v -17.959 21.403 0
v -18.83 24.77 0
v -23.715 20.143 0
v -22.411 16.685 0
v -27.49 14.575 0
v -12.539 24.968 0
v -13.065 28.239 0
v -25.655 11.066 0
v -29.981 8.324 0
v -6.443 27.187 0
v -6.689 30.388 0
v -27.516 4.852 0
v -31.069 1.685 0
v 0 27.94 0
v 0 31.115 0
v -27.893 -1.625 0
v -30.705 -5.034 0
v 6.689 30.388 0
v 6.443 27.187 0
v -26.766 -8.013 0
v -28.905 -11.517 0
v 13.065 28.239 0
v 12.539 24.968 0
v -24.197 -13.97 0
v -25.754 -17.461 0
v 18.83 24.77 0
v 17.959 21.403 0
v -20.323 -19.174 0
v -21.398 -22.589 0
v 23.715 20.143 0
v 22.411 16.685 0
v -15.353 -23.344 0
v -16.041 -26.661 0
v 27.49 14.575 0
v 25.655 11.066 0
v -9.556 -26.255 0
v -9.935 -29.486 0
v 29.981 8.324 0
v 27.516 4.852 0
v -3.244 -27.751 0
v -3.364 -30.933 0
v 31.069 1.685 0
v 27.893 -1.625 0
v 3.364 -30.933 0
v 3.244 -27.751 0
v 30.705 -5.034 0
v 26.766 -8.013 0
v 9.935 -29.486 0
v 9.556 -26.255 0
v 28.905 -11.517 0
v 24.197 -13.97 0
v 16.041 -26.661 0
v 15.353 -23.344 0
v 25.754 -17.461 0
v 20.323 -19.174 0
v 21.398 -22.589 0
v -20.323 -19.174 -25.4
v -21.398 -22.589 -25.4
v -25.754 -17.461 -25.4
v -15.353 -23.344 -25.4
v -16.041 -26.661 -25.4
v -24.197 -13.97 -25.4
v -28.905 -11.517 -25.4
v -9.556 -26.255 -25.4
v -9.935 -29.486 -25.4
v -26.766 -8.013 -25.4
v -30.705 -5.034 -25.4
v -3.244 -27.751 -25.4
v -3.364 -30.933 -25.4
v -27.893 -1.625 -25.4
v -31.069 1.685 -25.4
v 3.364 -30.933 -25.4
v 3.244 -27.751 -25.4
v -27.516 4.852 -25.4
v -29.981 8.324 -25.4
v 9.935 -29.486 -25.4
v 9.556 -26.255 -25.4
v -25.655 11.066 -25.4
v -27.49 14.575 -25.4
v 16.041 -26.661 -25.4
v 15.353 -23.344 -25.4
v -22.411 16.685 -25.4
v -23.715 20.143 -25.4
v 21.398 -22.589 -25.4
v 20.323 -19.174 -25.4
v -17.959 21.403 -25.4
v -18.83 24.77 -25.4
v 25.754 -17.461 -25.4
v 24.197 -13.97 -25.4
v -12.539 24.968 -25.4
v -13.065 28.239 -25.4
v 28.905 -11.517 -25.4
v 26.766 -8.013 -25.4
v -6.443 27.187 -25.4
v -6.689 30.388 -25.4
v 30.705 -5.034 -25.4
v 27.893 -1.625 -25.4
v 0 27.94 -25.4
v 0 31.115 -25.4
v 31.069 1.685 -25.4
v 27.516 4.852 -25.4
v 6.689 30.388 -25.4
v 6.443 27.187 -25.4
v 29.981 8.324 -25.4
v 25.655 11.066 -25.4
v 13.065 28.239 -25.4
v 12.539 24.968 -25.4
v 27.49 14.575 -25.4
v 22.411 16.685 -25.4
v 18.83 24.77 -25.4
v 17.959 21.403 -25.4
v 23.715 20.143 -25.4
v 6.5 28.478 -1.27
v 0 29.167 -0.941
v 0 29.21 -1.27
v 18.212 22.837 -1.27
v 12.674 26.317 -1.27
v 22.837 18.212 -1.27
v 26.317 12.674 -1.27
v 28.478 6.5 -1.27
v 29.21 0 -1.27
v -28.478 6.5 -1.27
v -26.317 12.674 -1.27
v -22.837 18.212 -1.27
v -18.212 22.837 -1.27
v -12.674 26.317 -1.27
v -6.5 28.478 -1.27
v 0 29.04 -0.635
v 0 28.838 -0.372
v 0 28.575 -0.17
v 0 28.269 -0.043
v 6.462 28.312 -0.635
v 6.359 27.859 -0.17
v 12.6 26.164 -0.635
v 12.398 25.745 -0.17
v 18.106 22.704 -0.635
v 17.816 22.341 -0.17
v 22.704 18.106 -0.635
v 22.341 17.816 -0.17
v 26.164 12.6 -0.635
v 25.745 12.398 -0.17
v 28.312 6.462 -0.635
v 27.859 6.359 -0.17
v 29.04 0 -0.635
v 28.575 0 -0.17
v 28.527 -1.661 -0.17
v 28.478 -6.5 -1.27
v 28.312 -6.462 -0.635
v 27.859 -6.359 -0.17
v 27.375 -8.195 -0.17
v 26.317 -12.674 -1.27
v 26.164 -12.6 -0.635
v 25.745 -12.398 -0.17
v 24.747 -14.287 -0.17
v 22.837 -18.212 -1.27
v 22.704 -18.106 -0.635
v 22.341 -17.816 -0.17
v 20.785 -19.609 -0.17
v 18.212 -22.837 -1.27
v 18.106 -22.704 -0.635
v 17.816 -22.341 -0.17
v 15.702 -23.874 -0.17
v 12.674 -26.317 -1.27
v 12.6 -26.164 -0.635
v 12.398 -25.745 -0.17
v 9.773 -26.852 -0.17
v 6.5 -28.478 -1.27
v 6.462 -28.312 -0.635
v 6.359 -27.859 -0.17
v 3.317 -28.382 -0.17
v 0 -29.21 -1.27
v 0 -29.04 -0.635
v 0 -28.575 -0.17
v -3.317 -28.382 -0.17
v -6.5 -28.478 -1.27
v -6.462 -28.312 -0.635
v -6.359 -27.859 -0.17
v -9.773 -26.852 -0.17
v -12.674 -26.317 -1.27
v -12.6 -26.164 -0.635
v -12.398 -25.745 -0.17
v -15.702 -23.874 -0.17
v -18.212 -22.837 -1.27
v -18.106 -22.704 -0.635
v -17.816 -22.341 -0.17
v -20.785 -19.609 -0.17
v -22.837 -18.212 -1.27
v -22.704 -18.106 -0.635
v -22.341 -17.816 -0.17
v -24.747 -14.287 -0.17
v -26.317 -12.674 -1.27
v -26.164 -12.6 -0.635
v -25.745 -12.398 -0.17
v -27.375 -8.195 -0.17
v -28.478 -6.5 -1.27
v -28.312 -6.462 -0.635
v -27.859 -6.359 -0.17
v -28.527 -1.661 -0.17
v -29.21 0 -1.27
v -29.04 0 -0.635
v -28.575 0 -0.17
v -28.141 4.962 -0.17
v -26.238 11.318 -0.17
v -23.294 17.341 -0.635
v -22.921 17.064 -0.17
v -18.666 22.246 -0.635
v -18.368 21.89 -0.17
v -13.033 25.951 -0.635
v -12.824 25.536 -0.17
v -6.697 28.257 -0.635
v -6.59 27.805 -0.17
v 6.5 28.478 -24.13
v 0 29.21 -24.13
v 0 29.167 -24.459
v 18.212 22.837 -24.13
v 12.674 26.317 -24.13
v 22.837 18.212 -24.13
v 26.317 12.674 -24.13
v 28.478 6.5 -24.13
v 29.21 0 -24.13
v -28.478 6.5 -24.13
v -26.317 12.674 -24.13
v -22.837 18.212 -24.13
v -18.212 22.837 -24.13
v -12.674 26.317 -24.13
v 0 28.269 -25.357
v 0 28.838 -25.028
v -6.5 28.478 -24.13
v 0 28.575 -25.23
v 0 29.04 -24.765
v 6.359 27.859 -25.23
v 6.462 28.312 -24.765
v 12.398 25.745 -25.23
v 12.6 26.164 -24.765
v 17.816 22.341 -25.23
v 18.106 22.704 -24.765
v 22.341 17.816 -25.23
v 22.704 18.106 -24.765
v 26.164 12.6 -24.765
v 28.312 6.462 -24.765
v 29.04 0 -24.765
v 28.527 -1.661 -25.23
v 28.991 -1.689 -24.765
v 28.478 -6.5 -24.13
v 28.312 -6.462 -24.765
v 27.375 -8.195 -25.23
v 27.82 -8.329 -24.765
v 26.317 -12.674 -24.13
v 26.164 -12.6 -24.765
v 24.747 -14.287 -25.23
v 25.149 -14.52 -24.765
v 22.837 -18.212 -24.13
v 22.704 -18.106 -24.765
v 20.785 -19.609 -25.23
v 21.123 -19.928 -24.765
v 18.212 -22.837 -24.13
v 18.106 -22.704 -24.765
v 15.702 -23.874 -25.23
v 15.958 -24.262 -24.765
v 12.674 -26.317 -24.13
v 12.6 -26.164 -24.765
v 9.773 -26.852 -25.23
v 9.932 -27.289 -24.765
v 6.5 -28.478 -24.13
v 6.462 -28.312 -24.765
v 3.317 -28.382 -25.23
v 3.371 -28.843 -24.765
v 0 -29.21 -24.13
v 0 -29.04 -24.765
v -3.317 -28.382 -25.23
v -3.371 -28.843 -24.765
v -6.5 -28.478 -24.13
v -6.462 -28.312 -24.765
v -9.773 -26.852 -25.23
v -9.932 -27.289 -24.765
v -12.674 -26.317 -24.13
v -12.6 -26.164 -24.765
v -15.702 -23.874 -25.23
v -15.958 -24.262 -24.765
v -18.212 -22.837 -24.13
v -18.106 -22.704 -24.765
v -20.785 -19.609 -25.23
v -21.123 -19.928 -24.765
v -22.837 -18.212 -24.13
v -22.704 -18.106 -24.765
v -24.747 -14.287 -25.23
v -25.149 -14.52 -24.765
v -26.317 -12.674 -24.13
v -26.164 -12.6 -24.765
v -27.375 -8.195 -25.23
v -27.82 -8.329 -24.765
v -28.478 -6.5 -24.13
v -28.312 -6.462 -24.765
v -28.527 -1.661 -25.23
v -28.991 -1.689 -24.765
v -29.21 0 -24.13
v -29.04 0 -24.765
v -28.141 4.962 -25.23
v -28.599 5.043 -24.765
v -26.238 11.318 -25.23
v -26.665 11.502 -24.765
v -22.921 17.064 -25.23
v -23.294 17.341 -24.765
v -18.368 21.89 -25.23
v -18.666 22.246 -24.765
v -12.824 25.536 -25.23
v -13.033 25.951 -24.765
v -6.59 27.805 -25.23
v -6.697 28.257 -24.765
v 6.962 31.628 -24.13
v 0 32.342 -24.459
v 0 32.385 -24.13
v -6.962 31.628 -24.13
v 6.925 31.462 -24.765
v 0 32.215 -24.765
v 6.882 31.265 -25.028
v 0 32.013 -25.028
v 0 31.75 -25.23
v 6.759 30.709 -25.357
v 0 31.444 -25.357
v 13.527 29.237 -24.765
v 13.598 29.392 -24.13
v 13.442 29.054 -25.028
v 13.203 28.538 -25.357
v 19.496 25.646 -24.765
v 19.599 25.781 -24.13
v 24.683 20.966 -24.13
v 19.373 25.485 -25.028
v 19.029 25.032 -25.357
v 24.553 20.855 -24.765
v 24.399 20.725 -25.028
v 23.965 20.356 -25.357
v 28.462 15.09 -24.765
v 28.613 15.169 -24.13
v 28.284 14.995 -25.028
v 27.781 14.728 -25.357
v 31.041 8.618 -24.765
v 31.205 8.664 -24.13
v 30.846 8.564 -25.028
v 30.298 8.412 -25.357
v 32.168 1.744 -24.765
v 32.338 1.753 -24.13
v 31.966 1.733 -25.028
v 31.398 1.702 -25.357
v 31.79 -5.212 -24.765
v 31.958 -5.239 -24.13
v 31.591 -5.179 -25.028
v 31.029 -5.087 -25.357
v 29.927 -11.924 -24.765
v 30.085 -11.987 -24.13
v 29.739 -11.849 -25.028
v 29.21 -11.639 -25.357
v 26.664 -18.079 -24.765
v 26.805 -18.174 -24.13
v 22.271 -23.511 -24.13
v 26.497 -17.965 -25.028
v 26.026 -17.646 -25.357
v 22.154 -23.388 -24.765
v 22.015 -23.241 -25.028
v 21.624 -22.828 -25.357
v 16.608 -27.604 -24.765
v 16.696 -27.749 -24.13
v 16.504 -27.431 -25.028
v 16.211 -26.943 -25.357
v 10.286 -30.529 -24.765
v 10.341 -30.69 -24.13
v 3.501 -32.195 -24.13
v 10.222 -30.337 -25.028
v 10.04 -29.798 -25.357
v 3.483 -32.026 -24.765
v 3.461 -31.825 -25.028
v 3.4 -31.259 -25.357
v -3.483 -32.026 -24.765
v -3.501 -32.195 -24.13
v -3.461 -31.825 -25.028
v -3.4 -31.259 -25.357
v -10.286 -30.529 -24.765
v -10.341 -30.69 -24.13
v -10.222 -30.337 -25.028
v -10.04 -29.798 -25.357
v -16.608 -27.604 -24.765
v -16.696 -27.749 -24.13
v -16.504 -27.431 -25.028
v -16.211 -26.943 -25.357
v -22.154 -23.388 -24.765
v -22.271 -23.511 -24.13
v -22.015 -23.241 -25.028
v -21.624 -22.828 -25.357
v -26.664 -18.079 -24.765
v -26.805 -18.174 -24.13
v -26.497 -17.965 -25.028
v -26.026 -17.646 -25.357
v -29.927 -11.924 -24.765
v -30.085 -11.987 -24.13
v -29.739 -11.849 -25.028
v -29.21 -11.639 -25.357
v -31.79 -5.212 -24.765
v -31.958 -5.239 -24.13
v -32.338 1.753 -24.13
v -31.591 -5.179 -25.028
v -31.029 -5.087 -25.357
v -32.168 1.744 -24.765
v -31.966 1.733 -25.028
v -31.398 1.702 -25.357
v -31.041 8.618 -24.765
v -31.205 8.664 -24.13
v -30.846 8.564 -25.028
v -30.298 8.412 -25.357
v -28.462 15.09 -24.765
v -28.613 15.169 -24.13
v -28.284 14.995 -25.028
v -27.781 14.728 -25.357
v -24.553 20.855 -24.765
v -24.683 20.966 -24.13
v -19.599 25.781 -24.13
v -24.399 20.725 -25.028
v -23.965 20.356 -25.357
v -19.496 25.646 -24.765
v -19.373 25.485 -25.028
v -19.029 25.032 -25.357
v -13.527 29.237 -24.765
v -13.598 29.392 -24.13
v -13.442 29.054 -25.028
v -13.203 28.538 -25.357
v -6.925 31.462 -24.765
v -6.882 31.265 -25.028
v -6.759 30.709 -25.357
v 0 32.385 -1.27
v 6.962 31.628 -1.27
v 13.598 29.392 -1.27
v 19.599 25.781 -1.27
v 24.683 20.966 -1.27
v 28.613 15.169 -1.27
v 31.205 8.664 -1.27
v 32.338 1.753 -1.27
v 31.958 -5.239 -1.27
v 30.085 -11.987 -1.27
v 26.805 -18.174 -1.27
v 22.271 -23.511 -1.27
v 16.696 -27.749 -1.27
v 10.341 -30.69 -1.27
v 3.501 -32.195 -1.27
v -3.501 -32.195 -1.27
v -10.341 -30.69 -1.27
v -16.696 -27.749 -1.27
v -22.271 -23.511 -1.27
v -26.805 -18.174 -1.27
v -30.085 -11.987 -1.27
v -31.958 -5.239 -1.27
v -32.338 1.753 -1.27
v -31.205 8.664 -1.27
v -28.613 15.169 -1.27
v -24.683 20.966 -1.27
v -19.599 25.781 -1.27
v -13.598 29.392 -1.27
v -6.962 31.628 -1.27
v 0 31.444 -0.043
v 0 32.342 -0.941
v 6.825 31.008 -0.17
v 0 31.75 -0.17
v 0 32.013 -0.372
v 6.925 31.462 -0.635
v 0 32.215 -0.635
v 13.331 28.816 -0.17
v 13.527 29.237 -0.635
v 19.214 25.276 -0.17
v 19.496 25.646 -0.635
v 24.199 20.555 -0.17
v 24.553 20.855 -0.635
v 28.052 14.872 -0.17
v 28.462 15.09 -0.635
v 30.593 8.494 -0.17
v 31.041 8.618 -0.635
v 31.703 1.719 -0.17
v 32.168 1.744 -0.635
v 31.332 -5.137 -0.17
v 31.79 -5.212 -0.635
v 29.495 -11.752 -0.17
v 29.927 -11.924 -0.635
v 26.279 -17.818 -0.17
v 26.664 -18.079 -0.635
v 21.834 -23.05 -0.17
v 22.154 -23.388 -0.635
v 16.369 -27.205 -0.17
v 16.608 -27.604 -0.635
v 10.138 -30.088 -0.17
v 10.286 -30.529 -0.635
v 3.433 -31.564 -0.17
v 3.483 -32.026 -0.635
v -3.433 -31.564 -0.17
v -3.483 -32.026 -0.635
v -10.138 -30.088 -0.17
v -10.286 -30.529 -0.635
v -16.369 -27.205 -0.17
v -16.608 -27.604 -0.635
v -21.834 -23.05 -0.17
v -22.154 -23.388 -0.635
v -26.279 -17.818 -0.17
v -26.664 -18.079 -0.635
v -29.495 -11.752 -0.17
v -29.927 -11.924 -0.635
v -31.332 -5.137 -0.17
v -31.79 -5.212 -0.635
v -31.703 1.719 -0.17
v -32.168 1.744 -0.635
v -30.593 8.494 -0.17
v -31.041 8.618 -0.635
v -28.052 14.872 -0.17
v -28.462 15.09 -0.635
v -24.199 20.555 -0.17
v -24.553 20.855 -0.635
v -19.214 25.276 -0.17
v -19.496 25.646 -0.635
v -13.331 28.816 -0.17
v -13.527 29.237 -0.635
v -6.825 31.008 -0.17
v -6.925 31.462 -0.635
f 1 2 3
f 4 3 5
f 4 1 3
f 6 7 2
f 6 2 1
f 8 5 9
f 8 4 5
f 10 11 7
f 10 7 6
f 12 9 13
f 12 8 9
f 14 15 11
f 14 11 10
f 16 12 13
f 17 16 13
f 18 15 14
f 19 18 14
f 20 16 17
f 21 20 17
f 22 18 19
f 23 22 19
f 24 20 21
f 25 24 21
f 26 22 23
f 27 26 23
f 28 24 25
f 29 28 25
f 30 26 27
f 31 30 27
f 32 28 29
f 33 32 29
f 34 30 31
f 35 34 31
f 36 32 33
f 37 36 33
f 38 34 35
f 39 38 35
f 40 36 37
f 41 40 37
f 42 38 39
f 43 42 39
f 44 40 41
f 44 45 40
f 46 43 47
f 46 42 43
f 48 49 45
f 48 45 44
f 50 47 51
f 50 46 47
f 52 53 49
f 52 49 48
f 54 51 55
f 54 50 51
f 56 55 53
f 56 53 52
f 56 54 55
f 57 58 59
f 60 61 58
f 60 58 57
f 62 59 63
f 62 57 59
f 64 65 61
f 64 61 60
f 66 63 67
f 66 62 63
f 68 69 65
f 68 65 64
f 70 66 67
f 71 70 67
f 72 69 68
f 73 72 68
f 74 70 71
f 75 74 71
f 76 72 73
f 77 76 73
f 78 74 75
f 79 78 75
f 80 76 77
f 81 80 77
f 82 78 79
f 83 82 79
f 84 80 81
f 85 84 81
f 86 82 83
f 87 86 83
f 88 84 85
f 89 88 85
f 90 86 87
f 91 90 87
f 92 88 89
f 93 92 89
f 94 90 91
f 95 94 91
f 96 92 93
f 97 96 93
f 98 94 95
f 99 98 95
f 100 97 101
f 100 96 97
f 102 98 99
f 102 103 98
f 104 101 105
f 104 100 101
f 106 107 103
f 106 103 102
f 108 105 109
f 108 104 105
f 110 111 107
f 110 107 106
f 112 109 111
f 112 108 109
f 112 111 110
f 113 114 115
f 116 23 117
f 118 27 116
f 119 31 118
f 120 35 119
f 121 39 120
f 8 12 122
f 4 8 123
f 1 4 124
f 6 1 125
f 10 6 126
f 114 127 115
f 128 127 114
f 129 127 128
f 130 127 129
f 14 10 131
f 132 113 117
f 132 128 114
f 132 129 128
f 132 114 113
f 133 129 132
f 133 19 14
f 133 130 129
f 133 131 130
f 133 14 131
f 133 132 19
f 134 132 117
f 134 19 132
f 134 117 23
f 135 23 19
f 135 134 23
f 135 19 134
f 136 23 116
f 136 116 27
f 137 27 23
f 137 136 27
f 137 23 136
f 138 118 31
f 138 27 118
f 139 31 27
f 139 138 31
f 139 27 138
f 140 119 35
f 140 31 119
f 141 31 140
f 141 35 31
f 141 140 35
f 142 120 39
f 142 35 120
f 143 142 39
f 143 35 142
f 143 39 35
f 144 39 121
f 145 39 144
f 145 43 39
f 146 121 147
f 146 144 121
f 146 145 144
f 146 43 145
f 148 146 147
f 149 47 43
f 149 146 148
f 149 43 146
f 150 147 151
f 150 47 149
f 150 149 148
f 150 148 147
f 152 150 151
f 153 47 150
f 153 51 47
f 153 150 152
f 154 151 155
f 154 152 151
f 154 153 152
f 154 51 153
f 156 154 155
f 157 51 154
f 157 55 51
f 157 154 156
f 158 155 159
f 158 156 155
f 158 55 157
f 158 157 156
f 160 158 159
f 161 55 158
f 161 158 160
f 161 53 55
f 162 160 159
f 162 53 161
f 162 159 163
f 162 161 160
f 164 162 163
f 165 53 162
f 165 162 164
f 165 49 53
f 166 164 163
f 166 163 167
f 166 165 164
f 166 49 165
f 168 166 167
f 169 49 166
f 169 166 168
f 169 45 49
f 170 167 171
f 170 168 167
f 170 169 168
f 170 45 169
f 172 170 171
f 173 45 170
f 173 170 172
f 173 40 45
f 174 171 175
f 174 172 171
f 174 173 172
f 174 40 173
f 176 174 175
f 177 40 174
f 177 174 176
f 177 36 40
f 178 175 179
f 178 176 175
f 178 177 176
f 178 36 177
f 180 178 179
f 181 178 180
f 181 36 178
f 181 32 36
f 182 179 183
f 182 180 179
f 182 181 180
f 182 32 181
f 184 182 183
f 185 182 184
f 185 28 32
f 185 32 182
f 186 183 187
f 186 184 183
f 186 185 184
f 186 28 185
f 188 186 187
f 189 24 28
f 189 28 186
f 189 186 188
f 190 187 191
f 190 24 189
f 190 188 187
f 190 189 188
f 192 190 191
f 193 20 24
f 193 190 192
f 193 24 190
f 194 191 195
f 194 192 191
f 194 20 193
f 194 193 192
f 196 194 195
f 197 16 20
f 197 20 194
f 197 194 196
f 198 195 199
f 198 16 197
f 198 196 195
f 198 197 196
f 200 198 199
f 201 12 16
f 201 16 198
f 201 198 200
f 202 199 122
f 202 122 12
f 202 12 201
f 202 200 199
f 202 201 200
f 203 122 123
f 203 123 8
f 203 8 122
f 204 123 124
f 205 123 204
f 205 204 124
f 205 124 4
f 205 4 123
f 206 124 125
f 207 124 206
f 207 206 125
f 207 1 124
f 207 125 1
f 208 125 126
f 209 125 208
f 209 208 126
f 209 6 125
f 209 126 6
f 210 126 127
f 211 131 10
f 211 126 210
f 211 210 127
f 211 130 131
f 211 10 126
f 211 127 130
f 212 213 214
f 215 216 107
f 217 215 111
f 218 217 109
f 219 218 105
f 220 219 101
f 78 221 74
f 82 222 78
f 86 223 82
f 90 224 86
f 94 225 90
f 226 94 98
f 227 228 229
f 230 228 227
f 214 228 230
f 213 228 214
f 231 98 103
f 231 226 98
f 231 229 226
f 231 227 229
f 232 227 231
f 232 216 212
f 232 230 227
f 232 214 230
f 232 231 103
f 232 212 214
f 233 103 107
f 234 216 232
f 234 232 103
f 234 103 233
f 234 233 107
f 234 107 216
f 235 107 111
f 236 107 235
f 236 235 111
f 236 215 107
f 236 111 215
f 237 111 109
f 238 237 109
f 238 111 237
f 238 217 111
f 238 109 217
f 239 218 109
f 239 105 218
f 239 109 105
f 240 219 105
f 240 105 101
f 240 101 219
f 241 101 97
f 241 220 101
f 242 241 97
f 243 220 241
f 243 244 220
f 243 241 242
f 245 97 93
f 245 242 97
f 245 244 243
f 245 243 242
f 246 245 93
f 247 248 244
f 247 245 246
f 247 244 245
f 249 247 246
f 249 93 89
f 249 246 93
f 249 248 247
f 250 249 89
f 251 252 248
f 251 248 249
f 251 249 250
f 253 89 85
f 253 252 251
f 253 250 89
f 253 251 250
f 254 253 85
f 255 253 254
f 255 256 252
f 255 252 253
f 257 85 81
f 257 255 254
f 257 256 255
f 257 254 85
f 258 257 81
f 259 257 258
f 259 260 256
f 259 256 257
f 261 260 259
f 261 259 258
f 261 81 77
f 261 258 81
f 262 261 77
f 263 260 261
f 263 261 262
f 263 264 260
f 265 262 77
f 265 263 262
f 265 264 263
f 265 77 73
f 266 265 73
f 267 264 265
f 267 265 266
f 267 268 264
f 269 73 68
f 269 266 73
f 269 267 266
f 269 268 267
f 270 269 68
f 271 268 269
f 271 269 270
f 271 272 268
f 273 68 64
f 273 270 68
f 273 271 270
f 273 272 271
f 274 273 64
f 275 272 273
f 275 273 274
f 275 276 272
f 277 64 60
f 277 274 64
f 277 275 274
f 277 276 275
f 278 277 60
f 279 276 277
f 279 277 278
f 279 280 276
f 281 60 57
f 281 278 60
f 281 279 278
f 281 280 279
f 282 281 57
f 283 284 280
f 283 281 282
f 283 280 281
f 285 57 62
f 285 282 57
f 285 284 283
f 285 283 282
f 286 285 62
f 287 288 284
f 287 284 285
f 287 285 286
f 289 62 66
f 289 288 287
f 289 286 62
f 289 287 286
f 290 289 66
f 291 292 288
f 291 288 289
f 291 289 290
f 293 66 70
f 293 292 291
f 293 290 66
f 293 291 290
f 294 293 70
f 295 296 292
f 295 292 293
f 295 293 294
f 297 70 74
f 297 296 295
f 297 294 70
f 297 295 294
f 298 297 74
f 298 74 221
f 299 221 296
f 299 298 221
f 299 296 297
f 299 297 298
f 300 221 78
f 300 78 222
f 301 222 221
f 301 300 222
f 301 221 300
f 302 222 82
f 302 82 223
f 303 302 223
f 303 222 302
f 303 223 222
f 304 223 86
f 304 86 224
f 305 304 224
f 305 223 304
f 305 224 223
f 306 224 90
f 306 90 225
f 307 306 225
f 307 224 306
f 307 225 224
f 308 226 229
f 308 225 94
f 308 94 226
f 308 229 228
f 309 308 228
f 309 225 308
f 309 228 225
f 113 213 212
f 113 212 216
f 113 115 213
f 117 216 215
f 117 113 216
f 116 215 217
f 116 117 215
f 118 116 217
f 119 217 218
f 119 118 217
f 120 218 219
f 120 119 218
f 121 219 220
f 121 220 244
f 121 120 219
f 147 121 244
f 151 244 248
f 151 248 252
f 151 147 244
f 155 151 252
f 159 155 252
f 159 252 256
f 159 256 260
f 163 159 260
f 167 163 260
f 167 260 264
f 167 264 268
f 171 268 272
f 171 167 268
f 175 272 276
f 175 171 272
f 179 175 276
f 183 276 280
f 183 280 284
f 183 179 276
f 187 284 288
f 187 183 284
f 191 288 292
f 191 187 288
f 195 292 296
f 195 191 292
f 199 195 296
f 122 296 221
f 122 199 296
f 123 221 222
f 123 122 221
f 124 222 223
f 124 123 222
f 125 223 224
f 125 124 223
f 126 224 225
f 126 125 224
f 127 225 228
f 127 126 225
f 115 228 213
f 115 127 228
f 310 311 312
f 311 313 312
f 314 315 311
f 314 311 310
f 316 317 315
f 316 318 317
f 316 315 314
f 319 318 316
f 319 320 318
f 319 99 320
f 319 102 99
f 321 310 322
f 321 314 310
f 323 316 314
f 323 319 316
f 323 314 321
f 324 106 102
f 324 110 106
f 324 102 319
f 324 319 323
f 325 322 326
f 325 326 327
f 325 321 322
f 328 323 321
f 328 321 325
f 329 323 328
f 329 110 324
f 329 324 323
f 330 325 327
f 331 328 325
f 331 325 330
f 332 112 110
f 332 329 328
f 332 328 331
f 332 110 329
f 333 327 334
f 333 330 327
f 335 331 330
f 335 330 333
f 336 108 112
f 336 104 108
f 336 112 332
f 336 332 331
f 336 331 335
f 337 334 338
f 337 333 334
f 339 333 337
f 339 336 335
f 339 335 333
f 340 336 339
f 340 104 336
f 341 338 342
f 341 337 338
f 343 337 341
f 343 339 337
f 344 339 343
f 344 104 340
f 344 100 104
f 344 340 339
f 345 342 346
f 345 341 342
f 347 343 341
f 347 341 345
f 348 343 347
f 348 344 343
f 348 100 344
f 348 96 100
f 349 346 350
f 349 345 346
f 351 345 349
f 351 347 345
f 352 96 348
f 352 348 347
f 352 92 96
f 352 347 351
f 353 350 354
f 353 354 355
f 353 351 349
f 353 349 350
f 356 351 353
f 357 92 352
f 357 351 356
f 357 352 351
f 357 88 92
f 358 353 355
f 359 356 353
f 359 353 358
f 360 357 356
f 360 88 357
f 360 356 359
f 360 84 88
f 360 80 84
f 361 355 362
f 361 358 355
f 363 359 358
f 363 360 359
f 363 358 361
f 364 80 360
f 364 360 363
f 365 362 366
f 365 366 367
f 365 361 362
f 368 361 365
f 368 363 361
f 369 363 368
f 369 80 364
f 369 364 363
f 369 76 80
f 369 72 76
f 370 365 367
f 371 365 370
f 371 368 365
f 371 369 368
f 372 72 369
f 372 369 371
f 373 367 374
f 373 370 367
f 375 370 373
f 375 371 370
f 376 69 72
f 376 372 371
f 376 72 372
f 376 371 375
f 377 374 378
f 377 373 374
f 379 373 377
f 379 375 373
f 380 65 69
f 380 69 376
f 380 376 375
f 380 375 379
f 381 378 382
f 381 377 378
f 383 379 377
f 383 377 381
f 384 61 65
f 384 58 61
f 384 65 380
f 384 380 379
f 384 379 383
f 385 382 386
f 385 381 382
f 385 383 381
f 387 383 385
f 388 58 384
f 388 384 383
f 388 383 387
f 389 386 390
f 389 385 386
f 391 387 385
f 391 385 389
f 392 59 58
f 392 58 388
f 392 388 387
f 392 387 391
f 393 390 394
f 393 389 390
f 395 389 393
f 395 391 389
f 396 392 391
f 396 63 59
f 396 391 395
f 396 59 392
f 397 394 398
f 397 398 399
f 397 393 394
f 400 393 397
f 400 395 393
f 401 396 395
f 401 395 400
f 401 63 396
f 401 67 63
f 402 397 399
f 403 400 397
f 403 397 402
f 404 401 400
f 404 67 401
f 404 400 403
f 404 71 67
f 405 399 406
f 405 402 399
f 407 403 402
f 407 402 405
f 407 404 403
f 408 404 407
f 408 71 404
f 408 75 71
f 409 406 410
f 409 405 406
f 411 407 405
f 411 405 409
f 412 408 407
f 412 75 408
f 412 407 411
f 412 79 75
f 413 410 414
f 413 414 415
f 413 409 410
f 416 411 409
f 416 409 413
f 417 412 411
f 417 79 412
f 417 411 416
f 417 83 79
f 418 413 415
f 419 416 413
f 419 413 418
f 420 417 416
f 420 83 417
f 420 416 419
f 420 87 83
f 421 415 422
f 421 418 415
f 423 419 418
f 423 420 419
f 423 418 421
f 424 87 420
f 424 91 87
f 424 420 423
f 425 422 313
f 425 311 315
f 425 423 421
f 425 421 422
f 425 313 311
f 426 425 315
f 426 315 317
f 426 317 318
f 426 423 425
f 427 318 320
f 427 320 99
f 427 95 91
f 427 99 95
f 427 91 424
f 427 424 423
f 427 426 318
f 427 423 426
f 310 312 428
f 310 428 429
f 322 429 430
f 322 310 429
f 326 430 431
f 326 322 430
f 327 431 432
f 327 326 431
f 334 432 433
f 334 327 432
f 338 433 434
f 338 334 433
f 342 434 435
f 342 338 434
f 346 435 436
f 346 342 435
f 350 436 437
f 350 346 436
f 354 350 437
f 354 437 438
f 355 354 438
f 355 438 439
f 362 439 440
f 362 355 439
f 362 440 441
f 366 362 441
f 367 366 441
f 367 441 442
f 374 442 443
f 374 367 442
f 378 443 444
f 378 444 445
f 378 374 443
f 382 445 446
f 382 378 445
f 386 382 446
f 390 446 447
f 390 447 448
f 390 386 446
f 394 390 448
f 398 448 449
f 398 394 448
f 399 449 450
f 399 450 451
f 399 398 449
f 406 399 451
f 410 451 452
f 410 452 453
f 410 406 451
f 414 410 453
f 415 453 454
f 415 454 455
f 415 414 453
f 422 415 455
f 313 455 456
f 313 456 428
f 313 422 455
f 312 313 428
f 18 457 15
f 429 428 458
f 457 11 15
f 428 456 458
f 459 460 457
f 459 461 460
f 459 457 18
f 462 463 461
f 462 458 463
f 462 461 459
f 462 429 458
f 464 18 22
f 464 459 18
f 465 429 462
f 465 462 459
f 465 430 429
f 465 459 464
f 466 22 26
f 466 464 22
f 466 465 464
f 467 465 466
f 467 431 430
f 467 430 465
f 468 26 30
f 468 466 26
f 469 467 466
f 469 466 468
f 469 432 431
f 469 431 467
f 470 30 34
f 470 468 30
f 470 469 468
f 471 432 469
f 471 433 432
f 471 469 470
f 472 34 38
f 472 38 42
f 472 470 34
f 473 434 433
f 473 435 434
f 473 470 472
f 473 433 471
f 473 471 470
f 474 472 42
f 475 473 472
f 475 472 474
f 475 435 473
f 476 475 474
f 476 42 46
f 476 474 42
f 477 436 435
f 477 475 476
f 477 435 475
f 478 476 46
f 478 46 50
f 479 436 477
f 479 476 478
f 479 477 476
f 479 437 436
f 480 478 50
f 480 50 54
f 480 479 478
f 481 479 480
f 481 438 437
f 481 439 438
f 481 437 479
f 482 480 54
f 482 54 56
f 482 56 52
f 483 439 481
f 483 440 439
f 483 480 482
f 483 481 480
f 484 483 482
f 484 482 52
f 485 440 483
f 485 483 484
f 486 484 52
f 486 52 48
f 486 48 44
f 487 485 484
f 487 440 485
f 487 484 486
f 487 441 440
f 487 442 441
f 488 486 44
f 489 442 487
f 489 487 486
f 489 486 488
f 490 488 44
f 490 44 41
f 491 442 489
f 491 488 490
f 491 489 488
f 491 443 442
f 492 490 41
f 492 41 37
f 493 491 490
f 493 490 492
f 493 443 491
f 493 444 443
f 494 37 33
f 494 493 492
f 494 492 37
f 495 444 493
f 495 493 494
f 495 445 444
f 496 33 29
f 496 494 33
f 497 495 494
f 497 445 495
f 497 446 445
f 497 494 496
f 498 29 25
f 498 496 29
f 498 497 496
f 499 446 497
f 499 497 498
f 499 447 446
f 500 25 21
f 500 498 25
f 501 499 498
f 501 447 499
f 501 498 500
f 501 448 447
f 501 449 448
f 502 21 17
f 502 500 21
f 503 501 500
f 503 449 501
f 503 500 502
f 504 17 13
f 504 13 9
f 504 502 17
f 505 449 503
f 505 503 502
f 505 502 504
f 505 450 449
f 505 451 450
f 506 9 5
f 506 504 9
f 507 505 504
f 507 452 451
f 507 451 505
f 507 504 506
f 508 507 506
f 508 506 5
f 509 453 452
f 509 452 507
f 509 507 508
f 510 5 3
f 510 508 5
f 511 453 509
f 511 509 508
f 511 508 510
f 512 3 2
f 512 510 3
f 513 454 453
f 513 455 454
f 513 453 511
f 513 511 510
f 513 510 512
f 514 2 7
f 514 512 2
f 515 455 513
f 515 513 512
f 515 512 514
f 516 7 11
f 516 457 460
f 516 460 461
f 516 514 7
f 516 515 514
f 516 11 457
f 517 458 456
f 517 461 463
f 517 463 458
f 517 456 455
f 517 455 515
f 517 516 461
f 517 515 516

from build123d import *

# Parameters (mm, degrees)
FILLET1_R = 1.27


with BuildPart() as part:
    # Sketch1 → Revolve1 (revolve)
    with BuildSketch(Plane(origin=(0, 0, 0), x_dir=(0, 0, -1), z_dir=(1, 0, 0))):
        with BuildLine():
            Line((0, 27.94), (0, 32.385))
            Line((0, 32.385), (25.4, 32.385))
            Line((25.4, 32.385), (25.4, 27.94))
            ThreePointArc((25.4, 27.94), (25.028025612, 28.838025612), (24.13, 29.21))
            Line((24.13, 29.21), (1.27, 29.21))
            ThreePointArc((1.27, 29.21), (0.371974388, 28.838025612), (0, 27.94))
        make_face()
    revolve(axis=Axis((0, 0, 0), (0, 0, -1)))

    # Fillet1
    fillet1_edges = [part.edges().sort_by_distance(p)[0] for p in [
        (0, -32.385, -25.4),
        (0, -32.385, 0),
    ]]
    fillet(fillet1_edges, radius=FILLET1_R)


solid = part.part
